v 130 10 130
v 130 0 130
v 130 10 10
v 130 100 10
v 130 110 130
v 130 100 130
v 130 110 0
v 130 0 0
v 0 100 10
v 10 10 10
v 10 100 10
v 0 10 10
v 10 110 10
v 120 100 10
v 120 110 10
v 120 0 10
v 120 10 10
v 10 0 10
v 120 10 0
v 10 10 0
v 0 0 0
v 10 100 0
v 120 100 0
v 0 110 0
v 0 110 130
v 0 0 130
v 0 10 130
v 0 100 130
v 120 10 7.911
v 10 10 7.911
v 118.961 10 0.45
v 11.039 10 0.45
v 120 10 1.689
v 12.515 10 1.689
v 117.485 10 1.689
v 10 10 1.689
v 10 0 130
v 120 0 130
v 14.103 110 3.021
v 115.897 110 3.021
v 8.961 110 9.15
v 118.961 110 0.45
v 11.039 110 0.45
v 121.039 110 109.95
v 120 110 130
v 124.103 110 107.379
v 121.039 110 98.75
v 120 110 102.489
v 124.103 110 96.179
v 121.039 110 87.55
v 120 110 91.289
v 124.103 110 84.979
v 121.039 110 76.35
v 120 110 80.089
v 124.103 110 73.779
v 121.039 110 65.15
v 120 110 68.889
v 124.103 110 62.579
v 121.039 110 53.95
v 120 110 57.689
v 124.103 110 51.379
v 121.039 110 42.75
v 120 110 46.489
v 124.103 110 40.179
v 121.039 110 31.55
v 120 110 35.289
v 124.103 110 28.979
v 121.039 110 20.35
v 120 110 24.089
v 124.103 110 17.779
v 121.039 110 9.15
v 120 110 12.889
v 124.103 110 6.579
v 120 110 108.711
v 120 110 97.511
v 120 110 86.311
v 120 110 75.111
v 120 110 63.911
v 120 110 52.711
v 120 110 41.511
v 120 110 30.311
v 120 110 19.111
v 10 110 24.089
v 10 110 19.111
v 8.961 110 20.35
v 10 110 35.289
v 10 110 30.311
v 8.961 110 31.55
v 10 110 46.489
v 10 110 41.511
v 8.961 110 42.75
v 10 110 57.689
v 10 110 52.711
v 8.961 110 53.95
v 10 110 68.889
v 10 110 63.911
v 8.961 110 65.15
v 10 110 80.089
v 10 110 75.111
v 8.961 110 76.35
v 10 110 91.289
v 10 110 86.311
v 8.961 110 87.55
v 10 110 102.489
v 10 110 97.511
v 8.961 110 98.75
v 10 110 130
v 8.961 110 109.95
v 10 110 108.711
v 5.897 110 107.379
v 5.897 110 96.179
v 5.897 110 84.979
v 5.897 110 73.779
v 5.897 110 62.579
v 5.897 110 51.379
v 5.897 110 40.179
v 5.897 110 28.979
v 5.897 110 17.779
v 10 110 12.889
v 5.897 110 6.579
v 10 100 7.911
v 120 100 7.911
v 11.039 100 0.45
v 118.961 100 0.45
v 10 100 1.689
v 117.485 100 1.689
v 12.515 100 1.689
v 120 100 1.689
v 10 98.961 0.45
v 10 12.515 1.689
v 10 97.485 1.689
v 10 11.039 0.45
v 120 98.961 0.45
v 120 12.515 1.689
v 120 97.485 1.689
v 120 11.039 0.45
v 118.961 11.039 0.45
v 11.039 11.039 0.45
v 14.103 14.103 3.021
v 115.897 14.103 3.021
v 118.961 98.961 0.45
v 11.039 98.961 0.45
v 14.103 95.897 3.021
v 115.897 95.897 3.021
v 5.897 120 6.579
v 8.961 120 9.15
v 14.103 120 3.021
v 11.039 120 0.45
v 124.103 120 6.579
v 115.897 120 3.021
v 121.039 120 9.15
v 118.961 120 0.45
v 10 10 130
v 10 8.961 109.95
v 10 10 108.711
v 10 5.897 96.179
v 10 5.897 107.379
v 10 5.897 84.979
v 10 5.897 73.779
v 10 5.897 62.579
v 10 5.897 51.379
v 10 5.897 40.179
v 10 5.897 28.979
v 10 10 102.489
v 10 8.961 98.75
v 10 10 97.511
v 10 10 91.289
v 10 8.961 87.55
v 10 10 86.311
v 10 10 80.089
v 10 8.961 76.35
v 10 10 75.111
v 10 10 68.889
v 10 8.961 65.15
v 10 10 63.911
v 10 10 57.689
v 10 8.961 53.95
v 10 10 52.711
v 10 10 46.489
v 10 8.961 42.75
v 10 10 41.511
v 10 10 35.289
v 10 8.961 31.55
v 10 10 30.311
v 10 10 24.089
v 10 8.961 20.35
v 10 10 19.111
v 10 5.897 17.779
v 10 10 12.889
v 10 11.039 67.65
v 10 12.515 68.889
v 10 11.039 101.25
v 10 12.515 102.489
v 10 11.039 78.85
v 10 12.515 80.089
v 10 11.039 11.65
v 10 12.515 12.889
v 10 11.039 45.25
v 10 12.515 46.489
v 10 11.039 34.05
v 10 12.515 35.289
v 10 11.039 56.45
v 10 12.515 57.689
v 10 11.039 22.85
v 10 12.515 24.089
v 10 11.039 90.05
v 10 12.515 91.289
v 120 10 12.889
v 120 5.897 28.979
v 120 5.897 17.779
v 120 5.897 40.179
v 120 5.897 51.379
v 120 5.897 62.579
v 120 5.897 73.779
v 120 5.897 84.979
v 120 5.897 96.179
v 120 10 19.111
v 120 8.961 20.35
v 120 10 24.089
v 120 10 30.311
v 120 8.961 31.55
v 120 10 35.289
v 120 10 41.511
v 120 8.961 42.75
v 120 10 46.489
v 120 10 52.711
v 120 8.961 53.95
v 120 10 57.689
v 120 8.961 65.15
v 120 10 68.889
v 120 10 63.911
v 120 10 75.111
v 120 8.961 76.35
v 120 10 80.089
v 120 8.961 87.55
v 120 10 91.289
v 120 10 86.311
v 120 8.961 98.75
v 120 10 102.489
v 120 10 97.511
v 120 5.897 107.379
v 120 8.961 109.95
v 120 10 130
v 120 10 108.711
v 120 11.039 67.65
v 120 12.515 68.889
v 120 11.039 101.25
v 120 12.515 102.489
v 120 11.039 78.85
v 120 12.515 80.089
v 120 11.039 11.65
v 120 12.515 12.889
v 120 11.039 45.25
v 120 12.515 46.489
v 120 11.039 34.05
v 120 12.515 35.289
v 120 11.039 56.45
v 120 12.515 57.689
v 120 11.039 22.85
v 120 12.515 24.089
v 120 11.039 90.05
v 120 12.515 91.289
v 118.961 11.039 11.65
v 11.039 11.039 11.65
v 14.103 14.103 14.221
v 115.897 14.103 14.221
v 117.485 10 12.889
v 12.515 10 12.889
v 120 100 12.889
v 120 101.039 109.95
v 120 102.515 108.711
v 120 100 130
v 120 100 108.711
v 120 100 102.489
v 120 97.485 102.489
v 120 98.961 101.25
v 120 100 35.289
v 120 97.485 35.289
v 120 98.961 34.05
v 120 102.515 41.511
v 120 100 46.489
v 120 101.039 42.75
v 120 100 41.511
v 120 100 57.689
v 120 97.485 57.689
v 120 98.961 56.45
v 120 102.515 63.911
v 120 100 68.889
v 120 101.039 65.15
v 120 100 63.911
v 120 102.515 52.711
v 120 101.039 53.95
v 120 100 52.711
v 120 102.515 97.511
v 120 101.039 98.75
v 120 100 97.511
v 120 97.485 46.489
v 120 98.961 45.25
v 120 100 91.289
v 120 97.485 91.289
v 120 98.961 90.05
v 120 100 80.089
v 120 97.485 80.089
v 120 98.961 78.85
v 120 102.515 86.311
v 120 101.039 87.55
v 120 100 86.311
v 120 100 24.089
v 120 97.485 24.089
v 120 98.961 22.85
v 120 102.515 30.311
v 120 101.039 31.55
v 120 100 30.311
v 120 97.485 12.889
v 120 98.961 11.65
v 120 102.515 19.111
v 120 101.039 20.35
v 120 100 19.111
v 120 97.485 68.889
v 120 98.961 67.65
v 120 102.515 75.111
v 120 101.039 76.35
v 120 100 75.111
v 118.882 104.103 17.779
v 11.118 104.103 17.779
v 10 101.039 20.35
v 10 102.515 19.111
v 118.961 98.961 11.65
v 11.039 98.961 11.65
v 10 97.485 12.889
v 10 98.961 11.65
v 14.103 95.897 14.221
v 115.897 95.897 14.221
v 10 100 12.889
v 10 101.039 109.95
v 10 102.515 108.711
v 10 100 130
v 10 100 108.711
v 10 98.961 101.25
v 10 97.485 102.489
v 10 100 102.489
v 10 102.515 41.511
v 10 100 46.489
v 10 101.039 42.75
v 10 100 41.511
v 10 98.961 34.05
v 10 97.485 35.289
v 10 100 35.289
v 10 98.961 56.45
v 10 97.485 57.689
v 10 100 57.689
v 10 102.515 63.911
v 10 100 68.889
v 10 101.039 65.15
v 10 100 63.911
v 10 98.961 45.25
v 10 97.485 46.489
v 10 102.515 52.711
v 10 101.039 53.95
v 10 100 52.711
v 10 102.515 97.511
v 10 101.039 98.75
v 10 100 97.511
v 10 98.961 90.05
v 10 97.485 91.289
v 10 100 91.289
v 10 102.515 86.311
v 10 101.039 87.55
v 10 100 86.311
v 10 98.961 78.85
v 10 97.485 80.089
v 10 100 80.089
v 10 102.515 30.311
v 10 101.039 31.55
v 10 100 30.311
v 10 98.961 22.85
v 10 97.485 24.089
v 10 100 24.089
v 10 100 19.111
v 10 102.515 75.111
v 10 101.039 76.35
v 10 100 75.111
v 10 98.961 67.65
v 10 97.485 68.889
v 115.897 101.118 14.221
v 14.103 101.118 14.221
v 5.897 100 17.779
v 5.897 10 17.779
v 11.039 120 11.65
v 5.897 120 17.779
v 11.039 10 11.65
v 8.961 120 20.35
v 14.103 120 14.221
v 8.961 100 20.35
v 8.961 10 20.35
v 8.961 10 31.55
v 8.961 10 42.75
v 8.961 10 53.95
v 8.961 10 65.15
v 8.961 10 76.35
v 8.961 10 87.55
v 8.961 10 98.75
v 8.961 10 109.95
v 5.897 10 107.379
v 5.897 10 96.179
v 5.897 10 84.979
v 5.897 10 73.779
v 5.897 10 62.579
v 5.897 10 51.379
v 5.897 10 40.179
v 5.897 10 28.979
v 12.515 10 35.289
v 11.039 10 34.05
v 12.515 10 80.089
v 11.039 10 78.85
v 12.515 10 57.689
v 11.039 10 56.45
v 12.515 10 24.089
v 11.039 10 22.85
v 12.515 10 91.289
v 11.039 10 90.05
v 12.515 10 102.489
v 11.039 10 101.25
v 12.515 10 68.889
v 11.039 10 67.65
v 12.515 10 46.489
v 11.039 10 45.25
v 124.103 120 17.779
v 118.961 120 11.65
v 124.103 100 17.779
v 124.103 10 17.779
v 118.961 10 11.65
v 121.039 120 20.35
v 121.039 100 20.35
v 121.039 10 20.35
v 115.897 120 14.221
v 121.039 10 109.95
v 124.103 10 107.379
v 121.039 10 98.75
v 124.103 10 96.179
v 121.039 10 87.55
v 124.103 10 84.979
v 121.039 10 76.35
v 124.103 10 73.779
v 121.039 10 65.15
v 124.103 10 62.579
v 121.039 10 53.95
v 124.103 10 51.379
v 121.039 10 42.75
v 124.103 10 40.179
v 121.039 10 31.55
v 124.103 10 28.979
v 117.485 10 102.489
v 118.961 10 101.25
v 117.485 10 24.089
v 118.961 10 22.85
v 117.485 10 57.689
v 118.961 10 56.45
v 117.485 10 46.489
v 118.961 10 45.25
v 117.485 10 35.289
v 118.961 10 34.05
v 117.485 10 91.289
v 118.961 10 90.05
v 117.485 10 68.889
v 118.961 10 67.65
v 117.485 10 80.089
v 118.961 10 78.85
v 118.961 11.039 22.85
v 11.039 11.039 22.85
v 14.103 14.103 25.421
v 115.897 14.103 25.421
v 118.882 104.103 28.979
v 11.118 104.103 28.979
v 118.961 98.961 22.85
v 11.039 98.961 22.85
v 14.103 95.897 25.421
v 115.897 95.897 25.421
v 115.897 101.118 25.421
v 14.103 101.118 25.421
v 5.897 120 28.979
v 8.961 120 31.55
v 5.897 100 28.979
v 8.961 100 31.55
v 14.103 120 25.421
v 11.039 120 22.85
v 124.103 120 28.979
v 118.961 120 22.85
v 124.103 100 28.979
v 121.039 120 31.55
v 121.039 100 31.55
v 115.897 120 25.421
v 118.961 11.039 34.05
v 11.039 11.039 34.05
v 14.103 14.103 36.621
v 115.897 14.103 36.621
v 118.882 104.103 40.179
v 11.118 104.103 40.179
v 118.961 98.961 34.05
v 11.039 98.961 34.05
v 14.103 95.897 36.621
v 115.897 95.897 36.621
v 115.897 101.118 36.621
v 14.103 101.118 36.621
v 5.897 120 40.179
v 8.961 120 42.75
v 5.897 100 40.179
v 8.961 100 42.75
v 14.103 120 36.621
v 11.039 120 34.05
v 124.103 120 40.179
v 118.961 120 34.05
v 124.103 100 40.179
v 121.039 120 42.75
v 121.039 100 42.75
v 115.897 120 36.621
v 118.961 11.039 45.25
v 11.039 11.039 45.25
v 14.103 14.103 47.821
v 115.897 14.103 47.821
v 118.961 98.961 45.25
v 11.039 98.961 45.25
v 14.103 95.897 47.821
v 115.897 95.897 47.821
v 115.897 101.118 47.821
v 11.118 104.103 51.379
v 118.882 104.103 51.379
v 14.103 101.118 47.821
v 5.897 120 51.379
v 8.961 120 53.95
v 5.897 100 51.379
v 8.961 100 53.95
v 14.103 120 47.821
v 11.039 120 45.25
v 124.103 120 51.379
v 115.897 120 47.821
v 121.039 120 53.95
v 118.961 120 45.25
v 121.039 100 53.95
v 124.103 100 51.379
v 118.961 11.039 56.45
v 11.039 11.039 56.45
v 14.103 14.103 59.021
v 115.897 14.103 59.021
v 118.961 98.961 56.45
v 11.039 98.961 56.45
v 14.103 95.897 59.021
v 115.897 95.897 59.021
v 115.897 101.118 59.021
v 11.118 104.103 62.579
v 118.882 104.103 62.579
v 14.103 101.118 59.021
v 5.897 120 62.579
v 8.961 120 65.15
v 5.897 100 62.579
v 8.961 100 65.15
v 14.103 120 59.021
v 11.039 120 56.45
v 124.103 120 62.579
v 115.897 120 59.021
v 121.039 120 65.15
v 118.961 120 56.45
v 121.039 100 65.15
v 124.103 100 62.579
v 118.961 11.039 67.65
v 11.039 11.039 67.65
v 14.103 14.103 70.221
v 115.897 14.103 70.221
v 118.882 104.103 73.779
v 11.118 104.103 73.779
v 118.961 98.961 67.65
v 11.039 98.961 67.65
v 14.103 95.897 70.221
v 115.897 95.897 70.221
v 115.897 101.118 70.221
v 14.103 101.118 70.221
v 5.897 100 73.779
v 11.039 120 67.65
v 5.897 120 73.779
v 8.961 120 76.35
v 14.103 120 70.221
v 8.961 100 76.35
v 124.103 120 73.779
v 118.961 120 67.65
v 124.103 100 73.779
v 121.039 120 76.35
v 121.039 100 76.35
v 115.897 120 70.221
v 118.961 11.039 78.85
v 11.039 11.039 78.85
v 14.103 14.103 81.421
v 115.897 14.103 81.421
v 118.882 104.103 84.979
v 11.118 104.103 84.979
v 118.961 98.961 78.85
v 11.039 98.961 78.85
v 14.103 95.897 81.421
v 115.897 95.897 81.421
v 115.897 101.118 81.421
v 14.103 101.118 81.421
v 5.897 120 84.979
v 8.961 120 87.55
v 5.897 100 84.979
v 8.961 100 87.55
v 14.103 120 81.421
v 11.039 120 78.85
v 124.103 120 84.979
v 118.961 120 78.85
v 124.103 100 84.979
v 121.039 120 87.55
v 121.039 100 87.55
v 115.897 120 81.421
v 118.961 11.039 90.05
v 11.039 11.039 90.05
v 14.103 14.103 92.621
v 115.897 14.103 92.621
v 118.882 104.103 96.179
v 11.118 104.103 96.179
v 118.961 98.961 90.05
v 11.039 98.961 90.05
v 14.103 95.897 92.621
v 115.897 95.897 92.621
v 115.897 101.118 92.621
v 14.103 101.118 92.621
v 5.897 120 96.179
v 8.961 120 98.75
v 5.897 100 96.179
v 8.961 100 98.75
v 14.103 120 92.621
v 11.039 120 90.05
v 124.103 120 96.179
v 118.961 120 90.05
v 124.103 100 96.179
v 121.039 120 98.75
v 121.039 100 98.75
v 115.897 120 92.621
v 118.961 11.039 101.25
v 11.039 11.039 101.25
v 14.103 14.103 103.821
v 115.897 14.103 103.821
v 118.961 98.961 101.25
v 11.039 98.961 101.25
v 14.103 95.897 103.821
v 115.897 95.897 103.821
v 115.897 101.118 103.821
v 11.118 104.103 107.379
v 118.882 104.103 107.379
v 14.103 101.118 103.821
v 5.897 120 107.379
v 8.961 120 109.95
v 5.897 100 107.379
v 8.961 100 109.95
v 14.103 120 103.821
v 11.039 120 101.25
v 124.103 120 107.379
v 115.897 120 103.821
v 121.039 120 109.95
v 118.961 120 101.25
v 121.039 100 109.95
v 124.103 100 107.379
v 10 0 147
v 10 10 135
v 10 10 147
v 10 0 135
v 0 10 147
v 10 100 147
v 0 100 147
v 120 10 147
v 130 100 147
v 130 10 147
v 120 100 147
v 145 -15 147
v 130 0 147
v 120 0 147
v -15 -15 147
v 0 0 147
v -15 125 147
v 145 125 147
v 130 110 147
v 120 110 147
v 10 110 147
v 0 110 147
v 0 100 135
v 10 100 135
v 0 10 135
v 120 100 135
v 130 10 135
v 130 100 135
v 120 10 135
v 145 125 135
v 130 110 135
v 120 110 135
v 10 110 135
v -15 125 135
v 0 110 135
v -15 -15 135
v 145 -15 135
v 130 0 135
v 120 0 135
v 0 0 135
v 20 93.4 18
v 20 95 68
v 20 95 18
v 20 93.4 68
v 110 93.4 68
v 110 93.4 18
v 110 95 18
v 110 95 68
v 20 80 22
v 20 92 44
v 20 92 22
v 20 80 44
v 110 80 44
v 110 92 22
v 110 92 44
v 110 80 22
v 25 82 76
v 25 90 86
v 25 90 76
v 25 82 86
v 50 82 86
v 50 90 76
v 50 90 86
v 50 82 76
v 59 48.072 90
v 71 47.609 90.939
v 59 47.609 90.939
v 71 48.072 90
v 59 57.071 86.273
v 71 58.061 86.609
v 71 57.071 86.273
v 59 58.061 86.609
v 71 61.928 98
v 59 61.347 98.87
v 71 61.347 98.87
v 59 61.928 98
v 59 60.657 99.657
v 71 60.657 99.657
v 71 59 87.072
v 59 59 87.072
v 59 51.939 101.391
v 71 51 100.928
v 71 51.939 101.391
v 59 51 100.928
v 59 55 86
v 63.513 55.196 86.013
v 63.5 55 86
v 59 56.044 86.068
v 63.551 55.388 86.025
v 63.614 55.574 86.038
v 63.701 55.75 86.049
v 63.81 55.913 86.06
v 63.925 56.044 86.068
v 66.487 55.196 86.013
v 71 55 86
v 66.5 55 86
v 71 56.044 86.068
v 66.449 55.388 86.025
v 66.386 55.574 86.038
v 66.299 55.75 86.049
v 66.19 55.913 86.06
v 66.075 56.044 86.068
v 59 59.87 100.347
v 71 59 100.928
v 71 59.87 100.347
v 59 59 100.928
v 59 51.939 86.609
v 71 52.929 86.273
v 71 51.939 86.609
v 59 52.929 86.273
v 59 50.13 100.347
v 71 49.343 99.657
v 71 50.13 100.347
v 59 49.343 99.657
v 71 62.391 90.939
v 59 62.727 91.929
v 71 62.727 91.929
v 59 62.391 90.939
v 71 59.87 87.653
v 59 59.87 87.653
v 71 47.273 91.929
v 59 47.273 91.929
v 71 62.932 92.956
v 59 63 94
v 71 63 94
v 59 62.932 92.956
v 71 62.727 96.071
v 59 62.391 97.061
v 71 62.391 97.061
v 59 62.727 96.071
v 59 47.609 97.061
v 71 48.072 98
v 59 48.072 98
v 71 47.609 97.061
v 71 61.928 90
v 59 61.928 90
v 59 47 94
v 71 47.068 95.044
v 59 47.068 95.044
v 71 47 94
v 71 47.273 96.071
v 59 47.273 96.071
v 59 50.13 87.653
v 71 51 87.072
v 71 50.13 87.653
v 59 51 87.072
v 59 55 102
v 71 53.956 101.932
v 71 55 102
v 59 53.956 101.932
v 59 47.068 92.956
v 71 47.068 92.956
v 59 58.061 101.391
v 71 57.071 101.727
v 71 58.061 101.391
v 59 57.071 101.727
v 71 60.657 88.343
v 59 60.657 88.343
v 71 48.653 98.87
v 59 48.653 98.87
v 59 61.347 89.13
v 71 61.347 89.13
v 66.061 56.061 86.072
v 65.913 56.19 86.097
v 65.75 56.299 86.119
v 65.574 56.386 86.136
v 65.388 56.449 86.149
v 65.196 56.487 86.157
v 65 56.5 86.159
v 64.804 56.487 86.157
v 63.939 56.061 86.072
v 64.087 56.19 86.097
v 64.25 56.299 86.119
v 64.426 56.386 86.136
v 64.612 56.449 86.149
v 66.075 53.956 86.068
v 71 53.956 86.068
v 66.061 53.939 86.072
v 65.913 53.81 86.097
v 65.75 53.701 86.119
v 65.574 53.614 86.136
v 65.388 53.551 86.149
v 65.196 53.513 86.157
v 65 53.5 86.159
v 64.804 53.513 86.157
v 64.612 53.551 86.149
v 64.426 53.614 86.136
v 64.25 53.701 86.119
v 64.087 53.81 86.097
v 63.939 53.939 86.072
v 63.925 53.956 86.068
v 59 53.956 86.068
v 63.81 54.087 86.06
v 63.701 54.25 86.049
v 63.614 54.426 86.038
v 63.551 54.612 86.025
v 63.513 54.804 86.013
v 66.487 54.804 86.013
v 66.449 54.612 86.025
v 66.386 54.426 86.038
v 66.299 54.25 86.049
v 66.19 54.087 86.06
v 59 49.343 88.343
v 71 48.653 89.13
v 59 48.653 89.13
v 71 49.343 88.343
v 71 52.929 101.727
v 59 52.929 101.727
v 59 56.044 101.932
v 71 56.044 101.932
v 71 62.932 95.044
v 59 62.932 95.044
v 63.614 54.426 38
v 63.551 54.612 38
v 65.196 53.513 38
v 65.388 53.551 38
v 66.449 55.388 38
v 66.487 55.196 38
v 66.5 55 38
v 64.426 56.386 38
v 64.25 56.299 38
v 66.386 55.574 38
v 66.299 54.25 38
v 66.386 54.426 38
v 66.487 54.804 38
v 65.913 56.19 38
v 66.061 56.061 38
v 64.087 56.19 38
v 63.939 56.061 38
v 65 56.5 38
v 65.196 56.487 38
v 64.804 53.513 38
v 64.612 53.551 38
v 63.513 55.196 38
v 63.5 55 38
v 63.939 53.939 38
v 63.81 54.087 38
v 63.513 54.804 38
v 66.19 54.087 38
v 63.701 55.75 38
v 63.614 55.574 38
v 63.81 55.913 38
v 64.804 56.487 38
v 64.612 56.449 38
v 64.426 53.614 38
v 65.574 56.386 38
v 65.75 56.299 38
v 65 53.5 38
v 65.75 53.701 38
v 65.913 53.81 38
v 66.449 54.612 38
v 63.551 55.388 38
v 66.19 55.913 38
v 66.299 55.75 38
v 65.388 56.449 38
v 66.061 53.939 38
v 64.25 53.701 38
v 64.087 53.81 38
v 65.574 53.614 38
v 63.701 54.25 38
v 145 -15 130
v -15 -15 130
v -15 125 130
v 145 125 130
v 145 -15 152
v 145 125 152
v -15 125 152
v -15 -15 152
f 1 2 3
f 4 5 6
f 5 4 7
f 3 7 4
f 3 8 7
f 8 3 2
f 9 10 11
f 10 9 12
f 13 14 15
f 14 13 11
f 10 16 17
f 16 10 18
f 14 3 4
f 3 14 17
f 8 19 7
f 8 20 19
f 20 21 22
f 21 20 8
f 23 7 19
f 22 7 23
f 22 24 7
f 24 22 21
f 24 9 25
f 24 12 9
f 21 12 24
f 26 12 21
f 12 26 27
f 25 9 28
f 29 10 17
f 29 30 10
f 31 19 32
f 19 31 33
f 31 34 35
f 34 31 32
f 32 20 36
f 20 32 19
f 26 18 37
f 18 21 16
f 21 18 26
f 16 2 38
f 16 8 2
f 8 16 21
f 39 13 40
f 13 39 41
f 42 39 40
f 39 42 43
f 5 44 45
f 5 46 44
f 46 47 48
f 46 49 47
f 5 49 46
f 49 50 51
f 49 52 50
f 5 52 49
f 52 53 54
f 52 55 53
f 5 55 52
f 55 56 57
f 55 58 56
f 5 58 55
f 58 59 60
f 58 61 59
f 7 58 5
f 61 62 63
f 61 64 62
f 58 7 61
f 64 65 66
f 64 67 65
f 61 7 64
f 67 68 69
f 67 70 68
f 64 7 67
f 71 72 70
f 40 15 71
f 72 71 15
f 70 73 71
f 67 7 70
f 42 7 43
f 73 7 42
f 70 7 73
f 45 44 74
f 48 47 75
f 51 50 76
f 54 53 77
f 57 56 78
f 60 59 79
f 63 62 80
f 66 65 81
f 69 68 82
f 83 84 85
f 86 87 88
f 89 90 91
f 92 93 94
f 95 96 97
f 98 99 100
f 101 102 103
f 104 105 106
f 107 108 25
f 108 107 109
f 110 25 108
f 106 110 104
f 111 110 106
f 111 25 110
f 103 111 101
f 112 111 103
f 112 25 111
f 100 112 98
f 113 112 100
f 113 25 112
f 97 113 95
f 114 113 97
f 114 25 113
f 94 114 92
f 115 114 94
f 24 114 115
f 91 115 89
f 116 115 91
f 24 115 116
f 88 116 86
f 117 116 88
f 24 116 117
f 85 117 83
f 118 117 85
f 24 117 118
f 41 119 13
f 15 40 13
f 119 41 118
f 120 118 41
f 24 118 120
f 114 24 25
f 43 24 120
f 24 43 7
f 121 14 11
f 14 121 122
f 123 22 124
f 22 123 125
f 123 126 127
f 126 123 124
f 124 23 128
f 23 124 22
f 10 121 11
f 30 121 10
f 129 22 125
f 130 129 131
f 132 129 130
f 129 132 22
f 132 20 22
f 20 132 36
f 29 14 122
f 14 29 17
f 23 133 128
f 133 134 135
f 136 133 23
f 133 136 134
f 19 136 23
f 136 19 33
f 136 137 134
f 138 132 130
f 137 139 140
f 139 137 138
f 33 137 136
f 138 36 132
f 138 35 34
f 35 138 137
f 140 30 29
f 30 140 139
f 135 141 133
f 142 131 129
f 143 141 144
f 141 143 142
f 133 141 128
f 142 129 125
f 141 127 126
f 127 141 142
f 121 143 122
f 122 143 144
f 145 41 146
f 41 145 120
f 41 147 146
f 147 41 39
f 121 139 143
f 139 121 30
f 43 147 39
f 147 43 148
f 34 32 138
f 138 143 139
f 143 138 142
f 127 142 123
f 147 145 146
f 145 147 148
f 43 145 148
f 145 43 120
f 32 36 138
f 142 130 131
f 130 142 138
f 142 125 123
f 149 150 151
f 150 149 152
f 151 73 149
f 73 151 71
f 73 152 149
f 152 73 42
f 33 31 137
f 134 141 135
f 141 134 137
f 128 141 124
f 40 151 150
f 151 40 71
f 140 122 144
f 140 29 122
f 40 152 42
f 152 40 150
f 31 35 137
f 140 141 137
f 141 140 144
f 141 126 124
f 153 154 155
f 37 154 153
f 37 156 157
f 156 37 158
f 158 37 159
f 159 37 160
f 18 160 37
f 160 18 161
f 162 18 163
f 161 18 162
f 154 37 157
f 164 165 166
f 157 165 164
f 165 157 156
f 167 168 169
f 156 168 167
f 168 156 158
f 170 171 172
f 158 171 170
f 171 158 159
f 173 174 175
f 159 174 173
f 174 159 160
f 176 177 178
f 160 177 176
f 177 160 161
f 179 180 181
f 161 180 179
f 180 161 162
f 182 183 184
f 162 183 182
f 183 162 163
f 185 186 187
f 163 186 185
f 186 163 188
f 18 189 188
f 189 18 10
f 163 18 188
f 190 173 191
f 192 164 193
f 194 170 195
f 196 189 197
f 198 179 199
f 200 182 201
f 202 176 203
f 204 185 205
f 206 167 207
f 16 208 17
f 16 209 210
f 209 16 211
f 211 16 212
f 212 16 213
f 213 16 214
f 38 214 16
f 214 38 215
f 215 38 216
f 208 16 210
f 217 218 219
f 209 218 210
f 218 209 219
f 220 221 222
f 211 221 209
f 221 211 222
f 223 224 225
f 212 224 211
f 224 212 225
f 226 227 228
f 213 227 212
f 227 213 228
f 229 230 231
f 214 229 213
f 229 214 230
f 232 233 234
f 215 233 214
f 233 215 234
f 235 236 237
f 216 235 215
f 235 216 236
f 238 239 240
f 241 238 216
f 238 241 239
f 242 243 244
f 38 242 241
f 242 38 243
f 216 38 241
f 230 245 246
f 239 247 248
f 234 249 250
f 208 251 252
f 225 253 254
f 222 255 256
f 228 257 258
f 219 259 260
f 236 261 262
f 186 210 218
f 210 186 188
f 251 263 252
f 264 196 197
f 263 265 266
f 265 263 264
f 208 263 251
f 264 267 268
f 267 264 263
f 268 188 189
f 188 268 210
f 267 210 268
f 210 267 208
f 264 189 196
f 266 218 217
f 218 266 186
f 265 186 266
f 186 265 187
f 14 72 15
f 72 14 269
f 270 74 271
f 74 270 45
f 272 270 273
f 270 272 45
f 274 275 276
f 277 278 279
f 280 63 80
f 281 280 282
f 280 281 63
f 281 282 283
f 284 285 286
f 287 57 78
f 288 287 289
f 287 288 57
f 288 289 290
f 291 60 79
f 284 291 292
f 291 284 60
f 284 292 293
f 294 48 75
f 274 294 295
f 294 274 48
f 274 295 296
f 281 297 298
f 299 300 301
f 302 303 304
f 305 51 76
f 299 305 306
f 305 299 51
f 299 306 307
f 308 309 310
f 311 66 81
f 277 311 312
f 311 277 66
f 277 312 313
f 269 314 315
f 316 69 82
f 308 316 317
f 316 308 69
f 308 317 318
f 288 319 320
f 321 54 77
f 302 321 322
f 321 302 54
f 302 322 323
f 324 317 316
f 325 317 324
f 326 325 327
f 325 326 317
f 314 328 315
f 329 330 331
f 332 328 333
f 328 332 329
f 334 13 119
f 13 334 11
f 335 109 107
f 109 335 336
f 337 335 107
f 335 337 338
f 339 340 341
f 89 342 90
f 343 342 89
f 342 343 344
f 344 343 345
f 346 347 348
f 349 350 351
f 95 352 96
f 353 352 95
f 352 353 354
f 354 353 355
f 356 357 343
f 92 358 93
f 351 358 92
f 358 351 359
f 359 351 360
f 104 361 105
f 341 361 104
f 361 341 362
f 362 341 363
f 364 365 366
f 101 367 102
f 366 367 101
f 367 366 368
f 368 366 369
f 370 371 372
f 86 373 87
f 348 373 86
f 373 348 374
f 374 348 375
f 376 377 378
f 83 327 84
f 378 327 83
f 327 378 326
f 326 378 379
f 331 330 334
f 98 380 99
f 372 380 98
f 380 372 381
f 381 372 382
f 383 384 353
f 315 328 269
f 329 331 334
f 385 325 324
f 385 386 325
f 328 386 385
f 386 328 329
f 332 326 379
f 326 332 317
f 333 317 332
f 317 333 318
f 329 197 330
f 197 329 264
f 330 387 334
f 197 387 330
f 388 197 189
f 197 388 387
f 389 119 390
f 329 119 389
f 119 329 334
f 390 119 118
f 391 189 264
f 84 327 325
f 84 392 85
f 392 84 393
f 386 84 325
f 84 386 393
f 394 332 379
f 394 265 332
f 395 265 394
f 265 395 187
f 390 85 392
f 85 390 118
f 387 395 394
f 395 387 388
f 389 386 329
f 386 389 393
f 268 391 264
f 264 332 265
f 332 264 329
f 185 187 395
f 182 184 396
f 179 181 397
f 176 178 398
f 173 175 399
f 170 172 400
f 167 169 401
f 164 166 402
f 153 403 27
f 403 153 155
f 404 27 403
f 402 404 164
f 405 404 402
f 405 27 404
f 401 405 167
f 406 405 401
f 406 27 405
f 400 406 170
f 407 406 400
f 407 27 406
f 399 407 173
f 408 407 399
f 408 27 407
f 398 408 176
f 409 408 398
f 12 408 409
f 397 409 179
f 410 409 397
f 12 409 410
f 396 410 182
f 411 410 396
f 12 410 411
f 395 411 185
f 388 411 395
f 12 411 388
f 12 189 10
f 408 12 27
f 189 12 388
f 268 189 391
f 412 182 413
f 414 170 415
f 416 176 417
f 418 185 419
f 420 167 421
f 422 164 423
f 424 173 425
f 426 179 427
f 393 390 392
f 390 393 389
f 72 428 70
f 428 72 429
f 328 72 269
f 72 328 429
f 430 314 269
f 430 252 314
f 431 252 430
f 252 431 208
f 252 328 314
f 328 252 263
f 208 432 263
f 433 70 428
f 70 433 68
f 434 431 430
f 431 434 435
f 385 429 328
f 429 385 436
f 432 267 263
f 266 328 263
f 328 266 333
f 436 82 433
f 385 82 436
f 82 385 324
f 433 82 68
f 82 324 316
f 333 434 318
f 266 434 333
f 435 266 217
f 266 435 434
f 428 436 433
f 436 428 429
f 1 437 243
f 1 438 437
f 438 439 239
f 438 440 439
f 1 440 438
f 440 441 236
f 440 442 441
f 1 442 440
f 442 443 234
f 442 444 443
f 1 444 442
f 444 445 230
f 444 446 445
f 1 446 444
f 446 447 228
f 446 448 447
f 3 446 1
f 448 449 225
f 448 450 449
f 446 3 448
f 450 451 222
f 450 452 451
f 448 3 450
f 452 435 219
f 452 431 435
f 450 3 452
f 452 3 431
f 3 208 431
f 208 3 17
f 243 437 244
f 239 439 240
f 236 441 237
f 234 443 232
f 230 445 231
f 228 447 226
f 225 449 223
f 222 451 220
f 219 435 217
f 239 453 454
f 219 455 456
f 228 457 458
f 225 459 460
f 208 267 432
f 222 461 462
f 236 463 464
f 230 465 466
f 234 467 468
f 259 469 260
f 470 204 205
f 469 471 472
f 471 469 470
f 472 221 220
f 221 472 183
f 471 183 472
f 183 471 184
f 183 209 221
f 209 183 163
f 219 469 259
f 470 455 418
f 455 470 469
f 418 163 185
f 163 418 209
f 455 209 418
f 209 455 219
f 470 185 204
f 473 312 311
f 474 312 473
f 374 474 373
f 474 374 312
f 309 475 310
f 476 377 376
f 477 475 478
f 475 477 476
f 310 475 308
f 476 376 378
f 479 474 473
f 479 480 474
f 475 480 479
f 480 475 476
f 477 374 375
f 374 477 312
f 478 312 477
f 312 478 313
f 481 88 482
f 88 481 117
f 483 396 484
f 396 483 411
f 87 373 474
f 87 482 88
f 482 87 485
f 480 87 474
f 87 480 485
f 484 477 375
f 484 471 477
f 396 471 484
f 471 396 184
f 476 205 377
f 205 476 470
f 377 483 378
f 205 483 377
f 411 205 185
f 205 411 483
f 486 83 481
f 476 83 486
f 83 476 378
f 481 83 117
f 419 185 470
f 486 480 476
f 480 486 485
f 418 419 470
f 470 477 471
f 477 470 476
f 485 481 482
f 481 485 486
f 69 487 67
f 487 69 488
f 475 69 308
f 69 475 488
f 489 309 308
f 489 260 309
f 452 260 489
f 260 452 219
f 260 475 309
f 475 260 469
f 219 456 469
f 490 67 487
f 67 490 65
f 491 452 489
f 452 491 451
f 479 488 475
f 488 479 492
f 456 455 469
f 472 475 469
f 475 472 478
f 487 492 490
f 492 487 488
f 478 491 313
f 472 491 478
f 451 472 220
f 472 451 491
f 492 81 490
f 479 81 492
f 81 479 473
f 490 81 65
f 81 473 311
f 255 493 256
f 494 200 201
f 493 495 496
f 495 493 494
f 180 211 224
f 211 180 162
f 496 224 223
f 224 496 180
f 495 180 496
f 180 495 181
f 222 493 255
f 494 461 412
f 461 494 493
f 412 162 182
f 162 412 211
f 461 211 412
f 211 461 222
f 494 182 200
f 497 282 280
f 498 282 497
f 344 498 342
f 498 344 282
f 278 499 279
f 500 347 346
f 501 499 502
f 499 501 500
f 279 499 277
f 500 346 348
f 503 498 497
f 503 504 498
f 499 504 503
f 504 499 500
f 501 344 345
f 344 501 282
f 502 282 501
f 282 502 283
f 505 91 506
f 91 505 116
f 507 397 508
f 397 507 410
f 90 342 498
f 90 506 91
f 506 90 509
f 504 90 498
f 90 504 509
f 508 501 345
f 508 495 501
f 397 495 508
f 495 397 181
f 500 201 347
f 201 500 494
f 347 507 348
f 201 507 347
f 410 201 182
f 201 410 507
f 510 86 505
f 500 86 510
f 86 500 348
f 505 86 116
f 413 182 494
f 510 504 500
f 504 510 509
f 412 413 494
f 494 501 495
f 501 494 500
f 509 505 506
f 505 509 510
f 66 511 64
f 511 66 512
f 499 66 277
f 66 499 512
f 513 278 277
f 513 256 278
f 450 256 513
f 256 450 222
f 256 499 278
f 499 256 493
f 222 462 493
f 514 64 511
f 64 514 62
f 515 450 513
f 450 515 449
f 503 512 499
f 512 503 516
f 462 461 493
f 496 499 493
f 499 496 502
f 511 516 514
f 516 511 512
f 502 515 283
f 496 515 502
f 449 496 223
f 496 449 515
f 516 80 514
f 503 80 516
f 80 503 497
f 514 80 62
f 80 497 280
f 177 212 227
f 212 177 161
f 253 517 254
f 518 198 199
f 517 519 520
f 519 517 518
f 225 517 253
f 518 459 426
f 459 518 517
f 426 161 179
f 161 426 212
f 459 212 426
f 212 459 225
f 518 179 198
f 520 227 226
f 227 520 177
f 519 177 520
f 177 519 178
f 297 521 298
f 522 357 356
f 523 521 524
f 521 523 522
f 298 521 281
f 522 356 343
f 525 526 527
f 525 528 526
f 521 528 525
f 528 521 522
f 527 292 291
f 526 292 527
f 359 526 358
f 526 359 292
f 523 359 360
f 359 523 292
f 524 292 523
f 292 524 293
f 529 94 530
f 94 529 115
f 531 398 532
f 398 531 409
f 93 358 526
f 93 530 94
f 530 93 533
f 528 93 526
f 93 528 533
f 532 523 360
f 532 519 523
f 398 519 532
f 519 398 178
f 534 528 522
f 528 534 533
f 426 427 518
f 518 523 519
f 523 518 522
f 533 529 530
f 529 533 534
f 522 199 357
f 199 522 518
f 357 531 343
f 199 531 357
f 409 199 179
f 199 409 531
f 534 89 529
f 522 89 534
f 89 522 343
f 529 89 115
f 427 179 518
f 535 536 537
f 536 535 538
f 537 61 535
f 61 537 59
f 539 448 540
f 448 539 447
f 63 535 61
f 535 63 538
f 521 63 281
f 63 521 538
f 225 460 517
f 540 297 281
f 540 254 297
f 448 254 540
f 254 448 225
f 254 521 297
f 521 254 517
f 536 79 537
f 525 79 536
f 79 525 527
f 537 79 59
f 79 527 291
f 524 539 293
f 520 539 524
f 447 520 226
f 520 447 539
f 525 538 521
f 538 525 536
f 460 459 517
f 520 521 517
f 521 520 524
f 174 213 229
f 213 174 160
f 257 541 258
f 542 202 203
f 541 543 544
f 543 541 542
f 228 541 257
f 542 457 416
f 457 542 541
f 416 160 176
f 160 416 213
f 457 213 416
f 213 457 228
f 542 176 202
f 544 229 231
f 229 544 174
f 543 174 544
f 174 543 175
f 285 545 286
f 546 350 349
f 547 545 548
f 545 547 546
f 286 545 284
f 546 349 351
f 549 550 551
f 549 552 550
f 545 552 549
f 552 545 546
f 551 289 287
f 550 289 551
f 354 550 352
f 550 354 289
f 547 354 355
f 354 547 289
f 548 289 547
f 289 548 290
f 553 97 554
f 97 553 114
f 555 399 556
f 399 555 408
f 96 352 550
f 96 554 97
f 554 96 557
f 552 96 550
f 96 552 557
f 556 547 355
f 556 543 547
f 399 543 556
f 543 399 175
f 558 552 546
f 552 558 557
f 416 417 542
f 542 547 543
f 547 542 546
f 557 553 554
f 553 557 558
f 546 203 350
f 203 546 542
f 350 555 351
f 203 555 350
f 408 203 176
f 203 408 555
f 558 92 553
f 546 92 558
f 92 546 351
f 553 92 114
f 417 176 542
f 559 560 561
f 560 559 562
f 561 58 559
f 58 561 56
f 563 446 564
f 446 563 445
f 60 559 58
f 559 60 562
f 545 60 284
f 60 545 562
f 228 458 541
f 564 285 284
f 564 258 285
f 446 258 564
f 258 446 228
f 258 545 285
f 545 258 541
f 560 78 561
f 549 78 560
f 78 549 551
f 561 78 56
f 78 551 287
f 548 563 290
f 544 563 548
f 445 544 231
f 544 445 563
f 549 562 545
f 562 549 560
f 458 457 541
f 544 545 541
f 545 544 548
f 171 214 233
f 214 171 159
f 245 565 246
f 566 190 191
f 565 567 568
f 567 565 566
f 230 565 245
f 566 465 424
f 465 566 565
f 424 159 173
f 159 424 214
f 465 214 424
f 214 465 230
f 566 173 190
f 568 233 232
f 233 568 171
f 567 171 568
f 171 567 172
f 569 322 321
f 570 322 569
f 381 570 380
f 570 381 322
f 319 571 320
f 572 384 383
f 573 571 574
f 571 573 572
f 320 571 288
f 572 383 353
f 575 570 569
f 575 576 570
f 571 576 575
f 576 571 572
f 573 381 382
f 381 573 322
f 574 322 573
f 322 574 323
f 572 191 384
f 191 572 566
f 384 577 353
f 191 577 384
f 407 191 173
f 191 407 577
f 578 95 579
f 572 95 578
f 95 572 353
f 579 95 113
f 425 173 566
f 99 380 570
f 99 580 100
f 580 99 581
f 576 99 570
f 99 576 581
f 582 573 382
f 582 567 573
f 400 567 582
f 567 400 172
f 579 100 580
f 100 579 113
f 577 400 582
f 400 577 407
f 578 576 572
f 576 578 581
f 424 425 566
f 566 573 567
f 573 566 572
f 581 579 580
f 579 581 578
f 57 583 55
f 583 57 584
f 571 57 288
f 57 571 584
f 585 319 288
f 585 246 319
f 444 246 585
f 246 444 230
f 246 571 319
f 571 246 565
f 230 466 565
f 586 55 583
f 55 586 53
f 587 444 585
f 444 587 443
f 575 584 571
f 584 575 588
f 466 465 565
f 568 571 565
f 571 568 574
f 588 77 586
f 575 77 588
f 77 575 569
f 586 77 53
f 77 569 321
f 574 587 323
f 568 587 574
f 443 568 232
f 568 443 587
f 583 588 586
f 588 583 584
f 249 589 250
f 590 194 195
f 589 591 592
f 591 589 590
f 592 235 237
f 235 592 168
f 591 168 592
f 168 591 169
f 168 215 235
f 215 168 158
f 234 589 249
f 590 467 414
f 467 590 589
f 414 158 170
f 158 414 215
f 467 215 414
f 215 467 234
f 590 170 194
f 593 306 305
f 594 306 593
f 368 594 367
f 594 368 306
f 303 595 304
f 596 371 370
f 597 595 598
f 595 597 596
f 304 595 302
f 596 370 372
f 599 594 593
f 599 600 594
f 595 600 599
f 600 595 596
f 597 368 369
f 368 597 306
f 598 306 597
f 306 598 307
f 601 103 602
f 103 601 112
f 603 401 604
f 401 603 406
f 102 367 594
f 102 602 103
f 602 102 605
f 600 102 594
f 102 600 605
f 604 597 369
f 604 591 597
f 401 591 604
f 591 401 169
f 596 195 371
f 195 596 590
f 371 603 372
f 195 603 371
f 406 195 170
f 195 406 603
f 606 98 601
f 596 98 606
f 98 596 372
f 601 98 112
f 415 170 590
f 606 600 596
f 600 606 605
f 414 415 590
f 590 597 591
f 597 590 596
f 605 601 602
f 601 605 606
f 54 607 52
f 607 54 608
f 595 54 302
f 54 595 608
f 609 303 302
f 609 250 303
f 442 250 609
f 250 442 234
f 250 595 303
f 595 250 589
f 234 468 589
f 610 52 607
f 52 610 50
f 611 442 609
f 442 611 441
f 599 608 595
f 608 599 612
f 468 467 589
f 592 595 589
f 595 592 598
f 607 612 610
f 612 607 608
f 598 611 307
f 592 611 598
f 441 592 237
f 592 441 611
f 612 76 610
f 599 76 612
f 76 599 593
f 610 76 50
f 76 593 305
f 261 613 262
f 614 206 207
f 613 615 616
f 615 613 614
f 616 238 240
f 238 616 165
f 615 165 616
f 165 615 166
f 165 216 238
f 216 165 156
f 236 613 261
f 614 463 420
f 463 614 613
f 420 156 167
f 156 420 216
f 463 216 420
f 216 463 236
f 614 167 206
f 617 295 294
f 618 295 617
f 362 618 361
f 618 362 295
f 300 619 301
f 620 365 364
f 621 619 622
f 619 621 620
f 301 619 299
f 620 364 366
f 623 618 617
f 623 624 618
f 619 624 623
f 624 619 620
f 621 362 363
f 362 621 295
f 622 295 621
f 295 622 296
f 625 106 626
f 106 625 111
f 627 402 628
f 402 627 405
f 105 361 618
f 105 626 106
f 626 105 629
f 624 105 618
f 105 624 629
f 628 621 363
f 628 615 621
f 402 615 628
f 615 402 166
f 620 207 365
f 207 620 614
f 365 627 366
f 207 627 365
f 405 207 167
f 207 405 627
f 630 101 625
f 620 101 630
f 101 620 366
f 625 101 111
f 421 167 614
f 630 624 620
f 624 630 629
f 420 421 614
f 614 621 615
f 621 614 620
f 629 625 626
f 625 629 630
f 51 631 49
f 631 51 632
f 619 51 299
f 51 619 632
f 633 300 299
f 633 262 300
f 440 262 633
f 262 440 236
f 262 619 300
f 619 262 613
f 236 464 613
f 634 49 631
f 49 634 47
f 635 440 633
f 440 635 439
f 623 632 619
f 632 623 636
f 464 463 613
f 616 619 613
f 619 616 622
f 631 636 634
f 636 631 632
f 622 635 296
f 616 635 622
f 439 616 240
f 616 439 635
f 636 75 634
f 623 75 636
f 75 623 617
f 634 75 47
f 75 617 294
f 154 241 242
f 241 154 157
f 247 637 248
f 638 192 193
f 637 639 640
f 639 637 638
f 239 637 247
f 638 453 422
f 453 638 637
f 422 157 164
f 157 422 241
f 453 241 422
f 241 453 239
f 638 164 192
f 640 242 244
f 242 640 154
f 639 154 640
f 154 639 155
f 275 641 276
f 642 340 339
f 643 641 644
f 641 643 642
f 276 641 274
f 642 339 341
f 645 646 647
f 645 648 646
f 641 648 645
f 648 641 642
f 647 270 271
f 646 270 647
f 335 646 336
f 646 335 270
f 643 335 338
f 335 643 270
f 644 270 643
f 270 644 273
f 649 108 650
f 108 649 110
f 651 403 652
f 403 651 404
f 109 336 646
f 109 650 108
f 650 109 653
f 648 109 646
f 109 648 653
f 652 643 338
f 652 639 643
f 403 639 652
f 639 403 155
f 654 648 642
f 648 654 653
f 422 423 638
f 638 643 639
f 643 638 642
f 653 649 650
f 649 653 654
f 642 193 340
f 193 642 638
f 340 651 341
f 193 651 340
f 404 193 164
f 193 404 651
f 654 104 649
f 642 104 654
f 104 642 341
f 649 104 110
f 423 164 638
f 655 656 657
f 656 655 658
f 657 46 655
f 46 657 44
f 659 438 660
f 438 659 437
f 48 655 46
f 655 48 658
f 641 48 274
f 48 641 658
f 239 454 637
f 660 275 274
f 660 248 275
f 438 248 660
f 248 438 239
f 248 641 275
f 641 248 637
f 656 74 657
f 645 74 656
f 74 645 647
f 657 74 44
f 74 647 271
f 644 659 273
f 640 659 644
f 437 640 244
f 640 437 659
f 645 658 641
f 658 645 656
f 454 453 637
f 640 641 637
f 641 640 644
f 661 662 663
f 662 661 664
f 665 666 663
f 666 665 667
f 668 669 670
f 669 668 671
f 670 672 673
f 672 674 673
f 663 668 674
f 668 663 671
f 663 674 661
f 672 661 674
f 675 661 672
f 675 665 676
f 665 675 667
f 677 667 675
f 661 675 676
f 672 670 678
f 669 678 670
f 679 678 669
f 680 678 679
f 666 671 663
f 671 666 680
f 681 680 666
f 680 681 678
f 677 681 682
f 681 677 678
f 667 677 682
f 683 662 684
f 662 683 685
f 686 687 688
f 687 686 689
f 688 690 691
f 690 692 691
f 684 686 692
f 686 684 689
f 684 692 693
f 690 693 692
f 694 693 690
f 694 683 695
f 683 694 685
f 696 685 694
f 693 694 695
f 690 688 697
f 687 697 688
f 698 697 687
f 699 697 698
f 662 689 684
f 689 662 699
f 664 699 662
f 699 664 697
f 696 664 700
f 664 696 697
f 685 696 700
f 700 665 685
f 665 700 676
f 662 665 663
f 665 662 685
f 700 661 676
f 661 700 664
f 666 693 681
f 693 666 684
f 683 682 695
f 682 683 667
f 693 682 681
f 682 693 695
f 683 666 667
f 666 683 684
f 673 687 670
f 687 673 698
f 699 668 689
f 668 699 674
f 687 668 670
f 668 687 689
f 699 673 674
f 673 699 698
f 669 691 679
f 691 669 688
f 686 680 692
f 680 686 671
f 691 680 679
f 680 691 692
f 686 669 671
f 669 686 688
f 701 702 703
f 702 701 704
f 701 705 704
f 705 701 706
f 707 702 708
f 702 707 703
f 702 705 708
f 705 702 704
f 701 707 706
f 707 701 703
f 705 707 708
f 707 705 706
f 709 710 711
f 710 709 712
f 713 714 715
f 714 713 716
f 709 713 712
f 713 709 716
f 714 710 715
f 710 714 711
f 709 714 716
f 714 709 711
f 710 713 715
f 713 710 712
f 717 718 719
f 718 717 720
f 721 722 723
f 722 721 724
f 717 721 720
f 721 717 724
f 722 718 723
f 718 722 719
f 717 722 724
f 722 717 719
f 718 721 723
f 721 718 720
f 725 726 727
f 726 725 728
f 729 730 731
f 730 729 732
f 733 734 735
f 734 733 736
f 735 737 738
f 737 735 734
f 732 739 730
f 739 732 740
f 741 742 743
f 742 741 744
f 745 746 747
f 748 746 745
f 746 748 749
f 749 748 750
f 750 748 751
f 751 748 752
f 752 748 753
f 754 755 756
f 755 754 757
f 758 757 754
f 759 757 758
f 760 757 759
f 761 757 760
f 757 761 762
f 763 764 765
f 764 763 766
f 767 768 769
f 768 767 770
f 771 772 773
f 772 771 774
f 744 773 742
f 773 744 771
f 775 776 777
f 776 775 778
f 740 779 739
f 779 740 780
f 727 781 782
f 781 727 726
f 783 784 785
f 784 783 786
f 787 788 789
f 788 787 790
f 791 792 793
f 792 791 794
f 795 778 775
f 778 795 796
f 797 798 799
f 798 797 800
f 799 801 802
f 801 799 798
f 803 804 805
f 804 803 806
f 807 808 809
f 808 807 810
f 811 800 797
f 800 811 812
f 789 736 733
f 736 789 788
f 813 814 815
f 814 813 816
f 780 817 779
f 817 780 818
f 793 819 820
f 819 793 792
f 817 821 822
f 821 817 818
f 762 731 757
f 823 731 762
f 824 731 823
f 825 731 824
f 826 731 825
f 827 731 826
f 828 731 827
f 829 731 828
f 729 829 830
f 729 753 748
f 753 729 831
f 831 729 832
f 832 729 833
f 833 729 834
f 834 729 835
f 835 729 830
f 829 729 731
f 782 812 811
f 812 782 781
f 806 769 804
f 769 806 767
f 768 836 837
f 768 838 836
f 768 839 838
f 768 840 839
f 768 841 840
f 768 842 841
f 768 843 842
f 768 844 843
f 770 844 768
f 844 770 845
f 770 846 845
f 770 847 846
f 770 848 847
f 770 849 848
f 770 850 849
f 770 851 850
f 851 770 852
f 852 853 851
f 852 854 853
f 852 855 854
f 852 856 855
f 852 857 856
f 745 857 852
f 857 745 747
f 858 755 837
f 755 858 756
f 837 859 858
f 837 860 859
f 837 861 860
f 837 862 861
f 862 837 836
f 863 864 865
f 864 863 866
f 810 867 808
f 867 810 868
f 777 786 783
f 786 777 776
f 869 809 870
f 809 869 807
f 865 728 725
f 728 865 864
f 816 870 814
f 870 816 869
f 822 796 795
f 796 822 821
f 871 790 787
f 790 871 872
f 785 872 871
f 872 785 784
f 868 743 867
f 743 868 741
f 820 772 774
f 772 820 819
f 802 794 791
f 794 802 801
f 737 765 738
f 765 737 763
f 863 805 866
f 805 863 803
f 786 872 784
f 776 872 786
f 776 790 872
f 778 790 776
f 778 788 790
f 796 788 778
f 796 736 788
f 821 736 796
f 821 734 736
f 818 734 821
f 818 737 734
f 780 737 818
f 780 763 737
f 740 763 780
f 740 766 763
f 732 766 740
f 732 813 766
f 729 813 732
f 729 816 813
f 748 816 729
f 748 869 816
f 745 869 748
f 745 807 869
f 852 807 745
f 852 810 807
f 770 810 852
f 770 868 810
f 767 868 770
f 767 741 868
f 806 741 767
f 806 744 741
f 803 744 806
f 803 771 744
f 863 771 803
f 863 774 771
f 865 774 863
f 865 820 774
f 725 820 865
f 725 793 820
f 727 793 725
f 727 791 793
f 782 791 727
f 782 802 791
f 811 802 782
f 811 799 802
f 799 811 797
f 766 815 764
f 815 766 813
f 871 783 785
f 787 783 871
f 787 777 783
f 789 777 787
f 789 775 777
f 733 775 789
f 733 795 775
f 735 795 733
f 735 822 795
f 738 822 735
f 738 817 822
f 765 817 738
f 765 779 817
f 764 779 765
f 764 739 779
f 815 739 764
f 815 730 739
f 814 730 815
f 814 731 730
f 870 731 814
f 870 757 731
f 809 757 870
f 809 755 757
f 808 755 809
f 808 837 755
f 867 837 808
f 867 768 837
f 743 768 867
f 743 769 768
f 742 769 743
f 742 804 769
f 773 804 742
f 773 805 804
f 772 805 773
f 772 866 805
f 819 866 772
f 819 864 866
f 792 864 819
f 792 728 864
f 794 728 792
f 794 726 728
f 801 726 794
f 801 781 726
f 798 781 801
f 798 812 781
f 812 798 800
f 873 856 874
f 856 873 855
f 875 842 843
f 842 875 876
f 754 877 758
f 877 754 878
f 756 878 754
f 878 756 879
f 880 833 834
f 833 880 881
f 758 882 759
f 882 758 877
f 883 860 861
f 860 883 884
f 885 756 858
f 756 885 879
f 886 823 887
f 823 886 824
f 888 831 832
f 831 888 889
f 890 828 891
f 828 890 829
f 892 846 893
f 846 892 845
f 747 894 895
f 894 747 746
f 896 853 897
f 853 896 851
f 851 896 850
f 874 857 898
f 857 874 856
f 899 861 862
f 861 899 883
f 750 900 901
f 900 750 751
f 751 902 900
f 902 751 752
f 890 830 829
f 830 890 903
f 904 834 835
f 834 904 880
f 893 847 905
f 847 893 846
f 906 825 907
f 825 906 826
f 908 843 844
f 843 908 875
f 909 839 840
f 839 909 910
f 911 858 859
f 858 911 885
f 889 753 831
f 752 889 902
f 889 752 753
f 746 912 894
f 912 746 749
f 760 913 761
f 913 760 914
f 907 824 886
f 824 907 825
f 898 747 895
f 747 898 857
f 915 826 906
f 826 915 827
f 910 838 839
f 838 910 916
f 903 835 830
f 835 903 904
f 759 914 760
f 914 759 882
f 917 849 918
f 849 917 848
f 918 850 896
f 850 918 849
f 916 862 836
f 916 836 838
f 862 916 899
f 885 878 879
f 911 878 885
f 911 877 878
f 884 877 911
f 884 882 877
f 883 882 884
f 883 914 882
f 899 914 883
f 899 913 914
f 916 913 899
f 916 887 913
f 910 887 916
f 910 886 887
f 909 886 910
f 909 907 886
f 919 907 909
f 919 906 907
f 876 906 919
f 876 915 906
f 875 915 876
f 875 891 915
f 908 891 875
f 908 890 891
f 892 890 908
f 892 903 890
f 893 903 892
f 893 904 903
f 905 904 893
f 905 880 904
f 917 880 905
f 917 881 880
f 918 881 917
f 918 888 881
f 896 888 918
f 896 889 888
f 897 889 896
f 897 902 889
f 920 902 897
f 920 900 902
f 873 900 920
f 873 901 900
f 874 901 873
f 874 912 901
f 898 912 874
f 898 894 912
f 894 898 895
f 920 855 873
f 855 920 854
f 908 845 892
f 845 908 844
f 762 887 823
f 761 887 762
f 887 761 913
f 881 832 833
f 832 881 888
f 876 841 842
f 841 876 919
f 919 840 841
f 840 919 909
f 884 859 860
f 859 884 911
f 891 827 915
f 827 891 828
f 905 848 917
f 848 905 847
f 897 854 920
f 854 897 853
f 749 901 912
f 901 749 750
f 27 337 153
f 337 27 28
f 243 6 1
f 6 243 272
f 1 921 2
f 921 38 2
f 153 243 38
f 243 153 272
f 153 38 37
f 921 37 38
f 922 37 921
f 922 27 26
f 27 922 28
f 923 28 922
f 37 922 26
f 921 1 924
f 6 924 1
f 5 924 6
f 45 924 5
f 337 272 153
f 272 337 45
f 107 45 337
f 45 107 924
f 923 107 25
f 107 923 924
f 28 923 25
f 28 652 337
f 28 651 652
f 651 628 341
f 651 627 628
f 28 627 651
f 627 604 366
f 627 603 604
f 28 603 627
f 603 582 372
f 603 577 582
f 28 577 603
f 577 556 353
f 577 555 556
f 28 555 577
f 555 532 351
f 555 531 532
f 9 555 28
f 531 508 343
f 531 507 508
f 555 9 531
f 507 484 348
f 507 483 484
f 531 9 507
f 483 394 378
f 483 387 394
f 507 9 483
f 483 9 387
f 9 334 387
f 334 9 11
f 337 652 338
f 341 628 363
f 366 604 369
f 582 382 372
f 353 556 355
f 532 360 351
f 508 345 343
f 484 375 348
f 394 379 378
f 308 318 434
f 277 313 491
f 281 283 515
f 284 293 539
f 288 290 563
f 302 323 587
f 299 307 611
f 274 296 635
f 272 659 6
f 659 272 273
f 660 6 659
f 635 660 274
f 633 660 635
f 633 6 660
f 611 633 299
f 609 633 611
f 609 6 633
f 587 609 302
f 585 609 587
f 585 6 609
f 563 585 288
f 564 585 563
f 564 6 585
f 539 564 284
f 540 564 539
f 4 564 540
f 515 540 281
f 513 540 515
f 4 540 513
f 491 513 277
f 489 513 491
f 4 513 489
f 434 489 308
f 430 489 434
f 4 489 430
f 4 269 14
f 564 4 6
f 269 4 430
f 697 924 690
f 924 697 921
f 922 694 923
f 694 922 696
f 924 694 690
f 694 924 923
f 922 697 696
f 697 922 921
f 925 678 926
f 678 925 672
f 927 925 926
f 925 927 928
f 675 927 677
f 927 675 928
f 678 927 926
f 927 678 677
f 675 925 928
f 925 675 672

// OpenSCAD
//
// ============================================================================
// MeteoHubSensor — MINI ÉCRAN DE STEVENSON
// V8 — adaptation du plan Stevenson traditionnel fourni
// ============================================================================
//
// Référence de conception :
// le plan traditionnel montre des lames inclinées vers l'extérieur,
// superposées sur les quatre faces, avec une vraie circulation d'air.
// Cette version reprend CE principe, à l'échelle du MeteoHubSensor.
//
// DIMENSIONS
// ----------
// Volume intérieur : 110 x 90 x 110 mm
// Caisson extérieur : 130 x 110 x 130 mm
//
// LAMELLES
// --------
// 10 par face
// section : 110 x 8 x 4 mm
// inclinaison : 40° sous l'horizontale
// pas vertical : 11.2 mm
// ouverture verticale projetée : ~2.5 mm
//
// IMPORTANT :
// "extérieur plus bas" est garanti sur les quatre faces.
//
// AVANT  : extérieur = Y-  -> +40°
// ARRIÈRE: extérieur = Y+  -> -40°
// GAUCHE : extérieur = X-  -> -40°
// DROITE : extérieur = X+  -> +40°
//
// Le choix de 40° est volontairement proche du profil visible sur
// la coupe du plan traditionnel fourni.
// ============================================================================

$fn = 48;

// ---------------------------------------------------------------------------
// CAISSON
// ---------------------------------------------------------------------------

IW = 110;
ID = 90;
IH = 110;

POST = 10;
POST_H = 130;

// ---------------------------------------------------------------------------
// LAMELLES
// ---------------------------------------------------------------------------

SLAT_L     = 110;
SLAT_T     = 4;
SLAT_H     = 8;

SLAT_COUNT = 10;
SLAT_PITCH = 11.2;

// Centre de la première lame.
// Les 10 lames couvrent pratiquement toute la hauteur intérieure.
SLAT_Z0 = 4.8;

SLAT_ANGLE = 40;

// ---------------------------------------------------------------------------
// TOIT DOUBLE — inspiré du principe du plan traditionnel
// ---------------------------------------------------------------------------

ROOF_W   = 160;
ROOF_D   = 140;
ROOF_T   = 5;
ROOF_GAP = 12;

// ---------------------------------------------------------------------------
// ÉLECTRONIQUE V1
// ---------------------------------------------------------------------------

SHOW_ELECTRONICS = true;

BOARD_X = 90;
BOARD_Y = 50;
BOARD_T = 1.6;

BAT_X = 90;
BAT_Y = 22;
BAT_T = 12;

RECT_X = 25;
RECT_Y = 10;
RECT_T = 8;

// ---------------------------------------------------------------------------
// COULEURS
// ---------------------------------------------------------------------------

wood        = [0.72,0.50,0.28];
wood_slat   = [0.82,0.62,0.38];
electronics = [0.15,0.18,0.20];
battery_col = [0.25,0.25,0.25];
rectifier_col = [0.10,0.35,0.10];
sensor_col  = [0.75,0.75,0.75];


// ============================================================================
// MONTANTS
// ============================================================================

module post(x,y) {
    color(wood)
        translate([x,y,0])
            cube([POST,POST,POST_H]);
}


// ============================================================================
// LAMELLES
//
// Chaque lame est centrée sur z puis inclinée.
//
// Le bord extérieur est toujours plus bas :
//
//                 INTÉRIEUR
//                     ▲
//                     │
//             ───────────────
//                ╲
//                 ╲
//                  ╲
//             ───────────────
//                     │
//                     ▼
//                 EXTÉRIEUR
//
// Le vide entre deux lames est réel : l'air peut entrer/sortir.
// ============================================================================

// AVANT : extérieur Y-
module slat_front(z) {
    color(wood_slat)
        translate([POST, POST, z])
            rotate([+SLAT_ANGLE,0,0])
                translate([0,-SLAT_T/2,-SLAT_H/2])
                    cube([SLAT_L,SLAT_T,SLAT_H]);
}

// ARRIÈRE : extérieur Y+
module slat_back(z) {
    color(wood_slat)
        translate([POST, ID+POST, z])
            rotate([-SLAT_ANGLE,0,0])
                translate([0,-SLAT_T/2,-SLAT_H/2])
                    cube([SLAT_L,SLAT_T,SLAT_H]);
}

// GAUCHE : extérieur X-
module slat_left(z) {
    color(wood_slat)
        translate([POST,POST,z])
            rotate([0,-SLAT_ANGLE,0])
                translate([-SLAT_T/2,0,-SLAT_H/2])
                    cube([SLAT_T,SLAT_L,SLAT_H]);
}

// DROITE : extérieur X+
module slat_right(z) {
    color(wood_slat)
        translate([IW+POST,POST,z])
            rotate([0,+SLAT_ANGLE,0])
                translate([-SLAT_T/2,0,-SLAT_H/2])
                    cube([SLAT_T,SLAT_L,SLAT_H]);
}


// ============================================================================
// CADRE INFÉRIEUR
//
// Le plan traditionnel possède un plancher intermédiaire.
// Pour MeteoHubSensor, on ne ferme pas le dessous : la sonde doit rester
// ventilée et l'électronique ne doit pas créer une poche thermique.
// On conserve uniquement un cadre porteur.
// ============================================================================

module lower_frame() {
    color(wood);

    // traverse avant
    translate([0,0,0])
        cube([IW+2*POST,POST,POST]);

    // traverse arrière
    translate([0,ID+POST,0])
        cube([IW+2*POST,POST,POST]);

    // traverses latérales
    translate([0,POST,0])
        cube([POST,ID,POST]);

    translate([IW+POST,POST,0])
        cube([POST,ID,POST]);
}


// ============================================================================
// DOUBLE TOIT
// ============================================================================

module roof_plate(z) {
    color(wood)
        translate([
            (IW+2*POST-ROOF_W)/2,
            (ID+2*POST-ROOF_D)/2,
            z
        ])
            cube([ROOF_W,ROOF_D,ROOF_T]);
}

module roof_spacer(x,y,z) {
    color(wood)
        translate([x,y,z])
            cube([POST,POST,ROOF_GAP]);
}


// ============================================================================
// ÉLECTRONIQUE V1 — SIMPLE ENCOMBREMENT
// ============================================================================

module board_demo() {

    // Carte actuelle 90 x 50 mm
    color(electronics)
        translate([POST+10, POST+ID-5, 18])
            rotate([90,0,0])
                cube([BOARD_X,BOARD_Y,BOARD_T]);

    // Support batterie 90 x 22 mm
    color(battery_col)
        translate([POST+10, POST+ID-8, 22])
            rotate([90,0,0])
                cube([BAT_X,BAT_Y,BAT_T]);

    // Petit redresseur 25 x 10 mm
    color(rectifier_col)
        translate([POST+15, POST+ID-10, 76])
            rotate([90,0,0])
                cube([RECT_X,RECT_Y,RECT_T]);
}


// ============================================================================
// CAPTEUR DÉPORTÉ
// ============================================================================

module sensor_demo() {

    // Position haute et centrale
    color(sensor_col)
        translate([
            POST+IW/2,
            POST+ID/2,
            94
        ])
            rotate([0,90,0])
                cylinder(d=16,h=12,center=true);

    // Faisceau indicatif
    color([0.08,0.08,0.08])
        translate([
            POST+IW/2,
            POST+ID/2,
            38
        ])
            cylinder(d=3,h=56);
}


// ============================================================================
// ABRI COMPLET
// ============================================================================

module shelter() {

    // 4 montants
    post(0,0);
    post(IW+POST,0);
    post(0,ID+POST);
    post(IW+POST,ID+POST);

    // Cadre inférieur ouvert
    lower_frame();

    // Lamelles Stevenson : 10 rangées sur chacune des 4 faces
    for (i=[0:SLAT_COUNT-1]) {

        z = SLAT_Z0 + i*SLAT_PITCH;

        slat_front(z);
        slat_back(z);
        slat_left(z);
        slat_right(z);
    }

    // Toit double : 12 mm de lame d'air
    roof_plate(POST_H);

    for (x=[0,IW+POST])
        for (y=[0,ID+POST])
            roof_spacer(x,y,POST_H+ROOF_T);

    roof_plate(POST_H+ROOF_T+ROOF_GAP);

    if (SHOW_ELECTRONICS)
        board_demo();

    sensor_demo();
}

shelter();


// ============================================================================
// NOMENCLATURE — BOIS
// ============================================================================
//
// 4 x montants
//     130 x 10 x 10 mm
//
// 40 x lamelles
//     110 x 8 x 4 mm
//     10 par face
//
// 4 x traverses du cadre inférieur
//     dimensions adaptées aux montants
//
// 2 x plaques de toit
//     160 x 140 x 5 mm
//
// 4 x entretoises de toit
//     10 x 10 x 12 mm
//
// ============================================================================
// VÉRIFICATION DE LA GÉOMÉTRIE
// ============================================================================
//
// Une lame de 8 x 4 mm inclinée de 40° présente une hauteur projetée
// d'environ :
//
//     8*cos(40°) + 4*sin(40°) ≈ 8.70 mm
//
// Le pas est 11.20 mm.
//
// Donc l'ouverture verticale entre deux lames est d'environ :
//
//     11.20 - 8.70 ≈ 2.50 mm
//
// Il existe donc un passage d'air réel.
//
// La lame descend vers l'extérieur sur les quatre faces :
// l'eau ne peut pas être conduite vers l'intérieur par la pente.
//
// ============================================================================
// ADAPTATION DU PLAN TRADITIONNEL
// ============================================================================
//
// Conservé :
//   - lames inclinées et superposées sur les faces
//   - structure à quatre montants
//   - forte protection solaire
//   - double toit ventilé
//
// Adapté pour MeteoHubSensor :
//   - dimensions miniatures
//   - pas de portes : abri fixe
//   - pas de plancher plein : meilleure ventilation du capteur
//   - capteur déporté en partie haute
//   - électronique en partie basse
//
// ============================================================================
